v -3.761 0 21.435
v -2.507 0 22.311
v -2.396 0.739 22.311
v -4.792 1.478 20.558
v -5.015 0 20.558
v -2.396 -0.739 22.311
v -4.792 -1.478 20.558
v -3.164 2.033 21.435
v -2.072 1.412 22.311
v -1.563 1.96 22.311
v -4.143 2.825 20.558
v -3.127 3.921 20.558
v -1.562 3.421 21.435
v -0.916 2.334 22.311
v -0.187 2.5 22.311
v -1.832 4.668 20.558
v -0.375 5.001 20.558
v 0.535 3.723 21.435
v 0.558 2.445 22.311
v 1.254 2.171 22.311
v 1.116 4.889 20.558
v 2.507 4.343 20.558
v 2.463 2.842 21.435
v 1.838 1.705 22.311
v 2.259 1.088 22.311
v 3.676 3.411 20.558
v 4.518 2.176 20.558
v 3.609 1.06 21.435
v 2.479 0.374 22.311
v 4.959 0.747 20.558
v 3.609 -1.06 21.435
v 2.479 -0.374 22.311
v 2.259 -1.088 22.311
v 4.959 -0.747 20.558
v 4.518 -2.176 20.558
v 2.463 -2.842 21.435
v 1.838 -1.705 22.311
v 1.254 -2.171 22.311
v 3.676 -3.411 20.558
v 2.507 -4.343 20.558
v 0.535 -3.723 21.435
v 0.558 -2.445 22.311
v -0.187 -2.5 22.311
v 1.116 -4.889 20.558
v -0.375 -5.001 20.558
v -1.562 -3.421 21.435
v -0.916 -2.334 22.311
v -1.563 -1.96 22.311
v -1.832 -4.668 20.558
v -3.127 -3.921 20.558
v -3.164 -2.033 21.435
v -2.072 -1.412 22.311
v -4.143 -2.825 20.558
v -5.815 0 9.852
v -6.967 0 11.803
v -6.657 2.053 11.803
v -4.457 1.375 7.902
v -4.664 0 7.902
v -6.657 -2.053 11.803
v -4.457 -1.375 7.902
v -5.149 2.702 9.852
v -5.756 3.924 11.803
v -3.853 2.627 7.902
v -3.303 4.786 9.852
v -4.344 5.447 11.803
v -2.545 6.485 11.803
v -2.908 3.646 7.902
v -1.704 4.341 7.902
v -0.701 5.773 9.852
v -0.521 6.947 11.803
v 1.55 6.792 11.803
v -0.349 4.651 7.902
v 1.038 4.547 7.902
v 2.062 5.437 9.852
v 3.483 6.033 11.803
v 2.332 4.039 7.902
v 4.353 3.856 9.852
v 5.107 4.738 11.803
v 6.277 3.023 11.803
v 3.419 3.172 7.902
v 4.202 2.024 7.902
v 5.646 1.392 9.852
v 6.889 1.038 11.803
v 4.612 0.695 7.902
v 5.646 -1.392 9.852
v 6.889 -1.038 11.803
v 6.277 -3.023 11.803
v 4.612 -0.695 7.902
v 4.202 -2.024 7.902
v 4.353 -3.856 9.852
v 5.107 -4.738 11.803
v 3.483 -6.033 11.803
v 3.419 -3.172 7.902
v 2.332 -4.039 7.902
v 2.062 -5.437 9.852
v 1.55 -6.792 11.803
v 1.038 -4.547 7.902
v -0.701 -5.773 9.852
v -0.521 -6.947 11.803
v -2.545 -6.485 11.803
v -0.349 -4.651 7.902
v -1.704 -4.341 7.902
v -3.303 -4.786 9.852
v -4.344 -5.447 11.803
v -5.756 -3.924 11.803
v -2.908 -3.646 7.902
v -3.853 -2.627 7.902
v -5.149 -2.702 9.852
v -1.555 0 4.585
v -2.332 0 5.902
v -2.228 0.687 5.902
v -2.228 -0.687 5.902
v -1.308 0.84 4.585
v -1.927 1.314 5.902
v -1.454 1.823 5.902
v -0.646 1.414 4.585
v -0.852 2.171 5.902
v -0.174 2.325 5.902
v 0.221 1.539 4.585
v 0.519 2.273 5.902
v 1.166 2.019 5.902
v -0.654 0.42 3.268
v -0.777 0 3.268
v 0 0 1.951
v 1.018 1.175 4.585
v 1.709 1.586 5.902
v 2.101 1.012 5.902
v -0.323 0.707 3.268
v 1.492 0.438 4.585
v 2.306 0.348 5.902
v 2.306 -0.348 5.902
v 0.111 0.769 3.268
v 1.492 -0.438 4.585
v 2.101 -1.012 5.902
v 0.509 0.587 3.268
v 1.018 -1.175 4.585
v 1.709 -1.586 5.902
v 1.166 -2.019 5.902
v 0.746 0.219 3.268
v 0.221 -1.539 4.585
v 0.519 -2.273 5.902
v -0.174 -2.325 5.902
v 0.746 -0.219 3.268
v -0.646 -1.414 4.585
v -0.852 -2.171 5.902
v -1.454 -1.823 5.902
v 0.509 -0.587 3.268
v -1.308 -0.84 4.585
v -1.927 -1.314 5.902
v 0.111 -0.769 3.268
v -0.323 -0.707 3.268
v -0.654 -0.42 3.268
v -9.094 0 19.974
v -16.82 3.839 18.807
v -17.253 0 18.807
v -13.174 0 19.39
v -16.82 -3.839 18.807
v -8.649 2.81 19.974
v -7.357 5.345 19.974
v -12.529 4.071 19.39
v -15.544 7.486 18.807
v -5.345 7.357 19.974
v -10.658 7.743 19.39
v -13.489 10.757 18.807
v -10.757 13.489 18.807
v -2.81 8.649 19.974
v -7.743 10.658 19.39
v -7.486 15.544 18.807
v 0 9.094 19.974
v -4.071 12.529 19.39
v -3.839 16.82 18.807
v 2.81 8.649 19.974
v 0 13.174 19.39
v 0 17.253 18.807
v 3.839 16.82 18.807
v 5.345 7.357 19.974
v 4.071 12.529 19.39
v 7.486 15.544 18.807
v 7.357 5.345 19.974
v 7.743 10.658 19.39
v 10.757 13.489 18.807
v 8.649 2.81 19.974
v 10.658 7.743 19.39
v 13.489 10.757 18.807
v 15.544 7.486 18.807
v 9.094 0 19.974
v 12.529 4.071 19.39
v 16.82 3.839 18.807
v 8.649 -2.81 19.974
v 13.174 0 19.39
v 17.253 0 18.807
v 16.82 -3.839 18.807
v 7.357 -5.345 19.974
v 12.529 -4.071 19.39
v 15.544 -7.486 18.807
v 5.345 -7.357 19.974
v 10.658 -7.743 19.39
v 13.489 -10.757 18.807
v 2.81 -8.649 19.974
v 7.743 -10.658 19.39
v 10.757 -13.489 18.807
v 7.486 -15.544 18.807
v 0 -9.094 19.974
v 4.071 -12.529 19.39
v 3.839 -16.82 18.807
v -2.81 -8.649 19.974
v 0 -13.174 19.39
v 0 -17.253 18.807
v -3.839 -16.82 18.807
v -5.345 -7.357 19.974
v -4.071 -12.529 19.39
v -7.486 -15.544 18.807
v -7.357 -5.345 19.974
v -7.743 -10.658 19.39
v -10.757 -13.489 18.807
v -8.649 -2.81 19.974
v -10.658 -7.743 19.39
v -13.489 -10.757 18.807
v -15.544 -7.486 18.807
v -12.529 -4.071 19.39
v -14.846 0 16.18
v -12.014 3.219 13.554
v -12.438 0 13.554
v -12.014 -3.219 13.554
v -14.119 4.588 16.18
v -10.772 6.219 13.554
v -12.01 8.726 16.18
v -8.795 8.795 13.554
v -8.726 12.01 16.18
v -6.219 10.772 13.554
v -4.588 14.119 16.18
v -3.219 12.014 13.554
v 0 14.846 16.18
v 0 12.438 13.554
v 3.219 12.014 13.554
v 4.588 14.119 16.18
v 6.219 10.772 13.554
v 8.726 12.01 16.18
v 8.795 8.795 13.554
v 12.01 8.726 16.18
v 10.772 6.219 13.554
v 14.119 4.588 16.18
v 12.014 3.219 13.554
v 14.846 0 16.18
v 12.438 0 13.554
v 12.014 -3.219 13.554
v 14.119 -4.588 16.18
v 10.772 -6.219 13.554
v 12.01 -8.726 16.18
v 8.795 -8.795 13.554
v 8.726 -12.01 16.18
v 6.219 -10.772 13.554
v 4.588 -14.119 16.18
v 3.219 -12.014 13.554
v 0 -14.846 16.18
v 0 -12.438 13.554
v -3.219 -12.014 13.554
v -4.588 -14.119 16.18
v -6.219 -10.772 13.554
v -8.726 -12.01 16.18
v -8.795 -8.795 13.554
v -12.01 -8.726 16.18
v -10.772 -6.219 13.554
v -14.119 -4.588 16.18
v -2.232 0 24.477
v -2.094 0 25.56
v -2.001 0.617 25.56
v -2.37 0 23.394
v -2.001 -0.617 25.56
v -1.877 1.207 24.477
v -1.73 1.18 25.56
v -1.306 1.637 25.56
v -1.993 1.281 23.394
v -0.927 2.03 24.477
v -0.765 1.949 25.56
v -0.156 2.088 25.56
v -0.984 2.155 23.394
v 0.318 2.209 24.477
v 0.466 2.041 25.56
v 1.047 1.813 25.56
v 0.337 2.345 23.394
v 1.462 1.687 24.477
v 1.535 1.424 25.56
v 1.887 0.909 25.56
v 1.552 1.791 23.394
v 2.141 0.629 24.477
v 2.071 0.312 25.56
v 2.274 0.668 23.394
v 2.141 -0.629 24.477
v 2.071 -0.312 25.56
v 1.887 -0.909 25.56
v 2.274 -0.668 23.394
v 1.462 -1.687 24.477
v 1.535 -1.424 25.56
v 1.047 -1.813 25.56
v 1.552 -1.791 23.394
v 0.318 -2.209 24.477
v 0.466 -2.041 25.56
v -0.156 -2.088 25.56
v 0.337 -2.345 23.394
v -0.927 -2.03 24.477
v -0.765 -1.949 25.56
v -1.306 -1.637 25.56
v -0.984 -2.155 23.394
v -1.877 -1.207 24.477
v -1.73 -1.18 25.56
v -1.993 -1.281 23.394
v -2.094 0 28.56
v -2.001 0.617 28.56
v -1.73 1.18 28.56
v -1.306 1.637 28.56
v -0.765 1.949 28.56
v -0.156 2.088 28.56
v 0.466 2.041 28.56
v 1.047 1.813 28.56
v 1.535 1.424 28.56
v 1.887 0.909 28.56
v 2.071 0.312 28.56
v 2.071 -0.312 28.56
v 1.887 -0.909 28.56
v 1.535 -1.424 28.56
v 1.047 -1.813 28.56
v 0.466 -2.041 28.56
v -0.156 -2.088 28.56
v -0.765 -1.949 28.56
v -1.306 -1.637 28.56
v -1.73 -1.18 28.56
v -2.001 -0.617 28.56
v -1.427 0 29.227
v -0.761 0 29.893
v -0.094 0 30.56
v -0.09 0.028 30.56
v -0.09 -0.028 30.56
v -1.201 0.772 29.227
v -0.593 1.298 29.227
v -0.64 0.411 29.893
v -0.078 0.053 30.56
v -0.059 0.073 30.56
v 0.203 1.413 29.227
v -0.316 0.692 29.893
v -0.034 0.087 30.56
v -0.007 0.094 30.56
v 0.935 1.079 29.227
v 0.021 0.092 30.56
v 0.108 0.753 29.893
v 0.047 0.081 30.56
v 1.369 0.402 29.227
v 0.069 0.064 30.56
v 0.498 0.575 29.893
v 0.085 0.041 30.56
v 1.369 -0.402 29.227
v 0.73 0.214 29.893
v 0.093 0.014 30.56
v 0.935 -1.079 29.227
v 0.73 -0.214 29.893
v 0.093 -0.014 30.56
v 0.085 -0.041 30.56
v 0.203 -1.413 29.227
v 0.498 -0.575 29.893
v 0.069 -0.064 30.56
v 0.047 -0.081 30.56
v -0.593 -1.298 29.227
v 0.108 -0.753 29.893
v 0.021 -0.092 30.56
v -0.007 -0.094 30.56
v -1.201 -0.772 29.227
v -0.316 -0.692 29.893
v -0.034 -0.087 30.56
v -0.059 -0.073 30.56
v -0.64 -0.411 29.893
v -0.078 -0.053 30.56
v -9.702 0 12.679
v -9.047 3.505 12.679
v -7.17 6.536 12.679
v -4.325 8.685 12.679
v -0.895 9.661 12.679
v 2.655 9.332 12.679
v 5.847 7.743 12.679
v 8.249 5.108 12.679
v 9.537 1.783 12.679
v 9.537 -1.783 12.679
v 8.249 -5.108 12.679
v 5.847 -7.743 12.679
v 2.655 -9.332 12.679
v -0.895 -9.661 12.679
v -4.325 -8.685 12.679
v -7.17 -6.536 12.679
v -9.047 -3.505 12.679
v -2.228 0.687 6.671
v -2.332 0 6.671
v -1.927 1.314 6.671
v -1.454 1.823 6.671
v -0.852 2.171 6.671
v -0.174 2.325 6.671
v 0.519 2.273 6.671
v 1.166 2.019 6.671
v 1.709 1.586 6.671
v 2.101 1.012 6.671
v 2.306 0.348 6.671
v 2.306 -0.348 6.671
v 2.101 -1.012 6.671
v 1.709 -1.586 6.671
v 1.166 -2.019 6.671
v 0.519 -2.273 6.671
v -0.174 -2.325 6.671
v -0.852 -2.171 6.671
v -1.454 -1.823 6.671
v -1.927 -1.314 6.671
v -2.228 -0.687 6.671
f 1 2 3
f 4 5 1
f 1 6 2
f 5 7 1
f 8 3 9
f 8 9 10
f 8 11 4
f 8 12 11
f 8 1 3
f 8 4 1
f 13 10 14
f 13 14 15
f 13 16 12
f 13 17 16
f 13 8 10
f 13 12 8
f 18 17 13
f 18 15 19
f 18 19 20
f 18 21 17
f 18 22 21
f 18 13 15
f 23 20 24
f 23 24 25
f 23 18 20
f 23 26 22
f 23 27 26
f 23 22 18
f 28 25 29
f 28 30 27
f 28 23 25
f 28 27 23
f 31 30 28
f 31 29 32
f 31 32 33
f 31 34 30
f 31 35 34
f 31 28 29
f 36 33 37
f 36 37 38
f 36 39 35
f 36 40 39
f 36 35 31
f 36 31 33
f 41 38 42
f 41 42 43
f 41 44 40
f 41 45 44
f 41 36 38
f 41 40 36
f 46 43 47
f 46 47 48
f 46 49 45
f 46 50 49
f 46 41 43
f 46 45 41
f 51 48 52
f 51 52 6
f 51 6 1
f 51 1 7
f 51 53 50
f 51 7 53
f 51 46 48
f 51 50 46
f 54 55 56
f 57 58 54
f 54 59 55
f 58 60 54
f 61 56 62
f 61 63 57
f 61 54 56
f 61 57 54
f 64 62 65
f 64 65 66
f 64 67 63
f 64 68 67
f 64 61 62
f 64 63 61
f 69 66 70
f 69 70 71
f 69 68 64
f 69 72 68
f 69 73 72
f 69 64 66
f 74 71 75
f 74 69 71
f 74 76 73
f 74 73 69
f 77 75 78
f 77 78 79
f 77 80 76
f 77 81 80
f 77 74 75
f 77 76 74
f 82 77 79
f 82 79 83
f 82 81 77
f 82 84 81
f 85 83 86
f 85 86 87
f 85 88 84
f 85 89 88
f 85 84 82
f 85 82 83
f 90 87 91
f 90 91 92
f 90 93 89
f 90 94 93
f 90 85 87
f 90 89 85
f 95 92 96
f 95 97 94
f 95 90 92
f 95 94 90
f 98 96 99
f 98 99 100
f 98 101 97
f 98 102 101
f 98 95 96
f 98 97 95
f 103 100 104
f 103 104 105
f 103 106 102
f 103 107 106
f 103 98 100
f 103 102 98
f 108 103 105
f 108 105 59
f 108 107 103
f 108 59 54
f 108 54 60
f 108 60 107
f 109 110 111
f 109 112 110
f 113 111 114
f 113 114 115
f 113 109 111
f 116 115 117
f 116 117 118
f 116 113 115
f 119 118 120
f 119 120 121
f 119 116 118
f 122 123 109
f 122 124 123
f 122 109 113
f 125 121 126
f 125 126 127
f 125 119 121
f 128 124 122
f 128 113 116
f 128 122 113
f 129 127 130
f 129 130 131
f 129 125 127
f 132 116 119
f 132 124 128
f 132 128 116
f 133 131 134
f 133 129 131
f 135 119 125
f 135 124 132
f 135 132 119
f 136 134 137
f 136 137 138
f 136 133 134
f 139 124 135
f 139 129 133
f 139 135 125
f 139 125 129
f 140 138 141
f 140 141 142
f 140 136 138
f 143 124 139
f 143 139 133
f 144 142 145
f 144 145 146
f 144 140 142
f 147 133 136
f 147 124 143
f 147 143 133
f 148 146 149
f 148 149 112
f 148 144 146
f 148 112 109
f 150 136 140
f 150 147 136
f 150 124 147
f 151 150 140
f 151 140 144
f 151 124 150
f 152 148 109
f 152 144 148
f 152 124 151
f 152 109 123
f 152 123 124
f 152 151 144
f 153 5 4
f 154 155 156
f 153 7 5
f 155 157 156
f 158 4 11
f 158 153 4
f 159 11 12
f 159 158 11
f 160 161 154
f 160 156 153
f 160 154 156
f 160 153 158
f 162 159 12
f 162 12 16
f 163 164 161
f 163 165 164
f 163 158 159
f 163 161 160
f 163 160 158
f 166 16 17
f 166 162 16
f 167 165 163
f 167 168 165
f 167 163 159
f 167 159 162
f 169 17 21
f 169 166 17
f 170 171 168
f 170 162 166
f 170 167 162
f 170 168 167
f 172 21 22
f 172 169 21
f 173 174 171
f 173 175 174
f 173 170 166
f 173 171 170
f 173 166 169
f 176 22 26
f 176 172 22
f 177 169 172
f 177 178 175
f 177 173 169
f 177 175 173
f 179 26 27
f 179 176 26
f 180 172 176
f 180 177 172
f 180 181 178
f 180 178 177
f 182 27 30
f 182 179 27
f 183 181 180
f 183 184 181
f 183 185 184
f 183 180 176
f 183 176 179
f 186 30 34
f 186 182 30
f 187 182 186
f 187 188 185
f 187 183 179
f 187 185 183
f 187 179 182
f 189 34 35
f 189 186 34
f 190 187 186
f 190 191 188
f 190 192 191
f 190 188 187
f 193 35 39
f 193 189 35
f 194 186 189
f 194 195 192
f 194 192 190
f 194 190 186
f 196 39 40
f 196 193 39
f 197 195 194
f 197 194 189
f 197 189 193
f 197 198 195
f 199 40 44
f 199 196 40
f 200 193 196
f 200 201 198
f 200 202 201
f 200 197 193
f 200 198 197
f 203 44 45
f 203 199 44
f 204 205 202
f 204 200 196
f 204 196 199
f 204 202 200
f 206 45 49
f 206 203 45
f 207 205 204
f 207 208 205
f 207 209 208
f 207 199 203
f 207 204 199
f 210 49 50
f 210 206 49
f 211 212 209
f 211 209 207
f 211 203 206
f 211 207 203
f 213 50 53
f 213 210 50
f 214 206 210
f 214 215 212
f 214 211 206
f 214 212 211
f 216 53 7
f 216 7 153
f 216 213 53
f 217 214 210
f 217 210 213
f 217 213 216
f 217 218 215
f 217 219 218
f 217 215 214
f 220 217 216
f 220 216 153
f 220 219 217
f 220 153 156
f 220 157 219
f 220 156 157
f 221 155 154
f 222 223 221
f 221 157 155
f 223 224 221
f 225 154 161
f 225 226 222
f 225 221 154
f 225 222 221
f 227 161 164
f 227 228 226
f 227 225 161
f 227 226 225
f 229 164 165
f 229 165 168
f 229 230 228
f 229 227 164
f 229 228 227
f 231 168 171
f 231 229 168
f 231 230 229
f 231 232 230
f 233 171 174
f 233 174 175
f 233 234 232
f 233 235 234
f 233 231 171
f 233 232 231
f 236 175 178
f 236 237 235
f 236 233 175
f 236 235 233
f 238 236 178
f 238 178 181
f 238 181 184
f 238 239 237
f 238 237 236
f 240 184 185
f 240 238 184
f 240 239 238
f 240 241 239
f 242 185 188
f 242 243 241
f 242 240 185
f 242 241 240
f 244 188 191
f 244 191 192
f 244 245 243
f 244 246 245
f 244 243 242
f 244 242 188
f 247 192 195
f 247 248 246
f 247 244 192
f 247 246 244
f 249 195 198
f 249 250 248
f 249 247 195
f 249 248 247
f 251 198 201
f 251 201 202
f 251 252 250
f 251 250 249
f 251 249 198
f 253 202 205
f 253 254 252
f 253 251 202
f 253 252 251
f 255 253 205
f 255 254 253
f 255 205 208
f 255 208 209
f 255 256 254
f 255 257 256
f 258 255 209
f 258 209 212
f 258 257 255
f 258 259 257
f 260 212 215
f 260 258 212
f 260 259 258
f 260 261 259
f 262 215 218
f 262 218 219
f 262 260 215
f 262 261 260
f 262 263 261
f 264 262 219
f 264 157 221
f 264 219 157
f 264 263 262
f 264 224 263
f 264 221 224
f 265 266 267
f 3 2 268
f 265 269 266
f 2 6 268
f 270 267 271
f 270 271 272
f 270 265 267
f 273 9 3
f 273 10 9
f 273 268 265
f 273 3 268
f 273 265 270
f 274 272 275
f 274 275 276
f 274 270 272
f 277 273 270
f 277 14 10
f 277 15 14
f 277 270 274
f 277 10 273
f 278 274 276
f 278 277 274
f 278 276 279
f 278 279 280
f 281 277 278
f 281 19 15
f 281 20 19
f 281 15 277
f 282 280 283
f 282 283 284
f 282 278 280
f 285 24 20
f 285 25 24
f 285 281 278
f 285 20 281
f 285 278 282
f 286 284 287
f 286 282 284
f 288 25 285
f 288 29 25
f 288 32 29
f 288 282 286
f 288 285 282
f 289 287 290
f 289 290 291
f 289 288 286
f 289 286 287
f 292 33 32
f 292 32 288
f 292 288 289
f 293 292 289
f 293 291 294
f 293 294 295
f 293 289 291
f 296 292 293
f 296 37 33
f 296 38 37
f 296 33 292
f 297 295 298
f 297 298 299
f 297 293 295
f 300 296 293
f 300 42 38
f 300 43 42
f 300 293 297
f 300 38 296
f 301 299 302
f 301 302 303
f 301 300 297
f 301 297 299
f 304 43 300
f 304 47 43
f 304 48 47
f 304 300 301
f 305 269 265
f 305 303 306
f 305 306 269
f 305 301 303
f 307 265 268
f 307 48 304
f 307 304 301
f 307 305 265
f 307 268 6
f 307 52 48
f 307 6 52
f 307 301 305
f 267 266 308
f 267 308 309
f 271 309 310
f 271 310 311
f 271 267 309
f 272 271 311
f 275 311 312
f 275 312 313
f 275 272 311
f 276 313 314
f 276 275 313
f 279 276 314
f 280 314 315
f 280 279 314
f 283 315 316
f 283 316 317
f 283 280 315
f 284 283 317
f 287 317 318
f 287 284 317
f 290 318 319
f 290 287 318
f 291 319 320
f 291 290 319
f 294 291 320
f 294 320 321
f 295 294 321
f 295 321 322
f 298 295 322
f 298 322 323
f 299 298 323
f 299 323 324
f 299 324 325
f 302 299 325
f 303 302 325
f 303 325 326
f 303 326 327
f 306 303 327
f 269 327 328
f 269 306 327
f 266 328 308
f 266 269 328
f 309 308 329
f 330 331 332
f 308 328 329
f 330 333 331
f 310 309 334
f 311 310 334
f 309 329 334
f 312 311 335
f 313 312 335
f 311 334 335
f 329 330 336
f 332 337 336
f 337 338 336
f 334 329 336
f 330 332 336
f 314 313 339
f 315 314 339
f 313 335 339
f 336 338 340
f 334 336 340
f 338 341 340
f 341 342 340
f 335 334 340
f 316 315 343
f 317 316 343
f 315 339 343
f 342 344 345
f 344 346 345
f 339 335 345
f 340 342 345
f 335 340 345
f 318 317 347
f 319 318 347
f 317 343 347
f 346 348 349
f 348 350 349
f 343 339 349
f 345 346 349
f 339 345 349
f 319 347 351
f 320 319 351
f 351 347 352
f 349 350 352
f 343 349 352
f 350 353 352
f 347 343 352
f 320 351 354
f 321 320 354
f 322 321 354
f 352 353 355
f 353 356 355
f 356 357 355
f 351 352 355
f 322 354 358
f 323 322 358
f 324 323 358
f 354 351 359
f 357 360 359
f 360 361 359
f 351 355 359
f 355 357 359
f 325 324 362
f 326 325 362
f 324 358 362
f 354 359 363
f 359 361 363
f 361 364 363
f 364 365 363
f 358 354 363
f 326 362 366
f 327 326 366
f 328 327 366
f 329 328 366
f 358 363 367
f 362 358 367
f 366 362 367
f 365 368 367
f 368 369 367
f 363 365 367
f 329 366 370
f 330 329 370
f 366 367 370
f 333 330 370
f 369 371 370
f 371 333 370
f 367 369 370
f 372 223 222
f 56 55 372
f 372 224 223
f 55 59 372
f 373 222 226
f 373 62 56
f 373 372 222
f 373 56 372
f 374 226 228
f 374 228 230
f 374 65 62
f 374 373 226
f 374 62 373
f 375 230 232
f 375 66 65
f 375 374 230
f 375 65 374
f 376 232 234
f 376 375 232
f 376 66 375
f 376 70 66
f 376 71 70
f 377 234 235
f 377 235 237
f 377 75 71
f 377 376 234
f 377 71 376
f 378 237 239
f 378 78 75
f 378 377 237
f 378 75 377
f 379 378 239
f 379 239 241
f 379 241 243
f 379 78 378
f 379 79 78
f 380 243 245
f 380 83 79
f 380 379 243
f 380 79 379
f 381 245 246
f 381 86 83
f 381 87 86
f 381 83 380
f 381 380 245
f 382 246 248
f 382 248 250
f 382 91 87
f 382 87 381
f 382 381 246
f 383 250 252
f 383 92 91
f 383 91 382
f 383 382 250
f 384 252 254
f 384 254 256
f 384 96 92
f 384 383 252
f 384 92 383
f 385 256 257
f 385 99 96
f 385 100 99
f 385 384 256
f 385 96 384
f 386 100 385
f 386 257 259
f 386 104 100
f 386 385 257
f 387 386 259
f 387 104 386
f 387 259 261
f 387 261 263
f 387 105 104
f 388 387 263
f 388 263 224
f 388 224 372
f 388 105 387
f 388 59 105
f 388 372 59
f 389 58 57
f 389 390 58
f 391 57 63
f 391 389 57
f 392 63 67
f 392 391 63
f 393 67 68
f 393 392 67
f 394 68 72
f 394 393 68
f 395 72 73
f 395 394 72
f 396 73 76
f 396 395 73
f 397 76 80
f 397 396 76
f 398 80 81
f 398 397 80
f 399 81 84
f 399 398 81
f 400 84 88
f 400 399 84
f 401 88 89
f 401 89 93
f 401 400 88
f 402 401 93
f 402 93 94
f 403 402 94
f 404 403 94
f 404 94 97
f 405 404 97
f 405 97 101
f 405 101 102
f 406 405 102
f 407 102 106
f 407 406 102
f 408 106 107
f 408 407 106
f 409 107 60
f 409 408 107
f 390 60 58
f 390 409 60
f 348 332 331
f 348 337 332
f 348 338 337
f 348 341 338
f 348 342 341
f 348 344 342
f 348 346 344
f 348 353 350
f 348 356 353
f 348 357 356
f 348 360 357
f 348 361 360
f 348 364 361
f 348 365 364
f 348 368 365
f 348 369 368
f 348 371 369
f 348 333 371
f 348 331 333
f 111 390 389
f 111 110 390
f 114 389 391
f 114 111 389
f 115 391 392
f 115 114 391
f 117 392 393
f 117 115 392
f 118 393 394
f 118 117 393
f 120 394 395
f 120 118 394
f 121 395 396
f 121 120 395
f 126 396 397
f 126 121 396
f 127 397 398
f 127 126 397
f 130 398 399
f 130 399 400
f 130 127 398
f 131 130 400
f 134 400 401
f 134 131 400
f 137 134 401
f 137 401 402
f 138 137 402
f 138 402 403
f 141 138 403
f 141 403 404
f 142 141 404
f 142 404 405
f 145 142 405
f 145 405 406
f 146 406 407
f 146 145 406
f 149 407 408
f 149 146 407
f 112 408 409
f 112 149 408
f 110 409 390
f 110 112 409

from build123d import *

# Parameters (mm, degrees)
F2_DEPTH = 5
F3_SIZE  = 2


with BuildPart() as f1:
    # F0 (on Front) → F1 (revolve)
    with BuildSketch(Plane.XZ):
        Polygon((-6.9665953279, 11.8032604518), (-4.6637503628, 7.9016302259), (-1.741648832, 7.9016302259), (0, 7.9016302259), (0, 20.5576719715), (-5.0148367882, 20.5576719715), (-17.2530292513, 18.8067907016), (-12.438103174, 13.5541430143), align=None)
        Polygon((-5.0148367882, 20.5576719715), (0, 20.5576719715), (0, 25.5600530654), (-2.0939521492, 25.5600530654), (-2.5074183941, 22.3113913089), align=None)
        Polygon((-1.741648832, 7.9016302259), (-4.6637503628, 7.9016302259), (-2.3318751814, 6.6709434614), (-2.3318751814, 5.9016302259), (0, 5.9016302259), (0, 7.9016302259), align=None)
        Polygon((-2.3318751814, 5.9016302259), (0, 1.9508151129), (0, 5.9016302259), align=None)
    revolve(axis=Axis((0, 0, 10.2788359857), (0, 0, -1)))

    # F2 (add): a face of the model
    f2_faces = [f1.faces().sort_by_distance(p)[0] for p in [
        (0, 0, 25.5600530654),
    ]]
    extrude(f2_faces, amount=F2_DEPTH)

    # F3
    f3_edges = [f1.edges().sort_by_distance(p)[0] for p in [
        (2.093952, 0, 30.560053),
    ]]
    chamfer(f3_edges, length=F3_SIZE)


solid = f1.part
